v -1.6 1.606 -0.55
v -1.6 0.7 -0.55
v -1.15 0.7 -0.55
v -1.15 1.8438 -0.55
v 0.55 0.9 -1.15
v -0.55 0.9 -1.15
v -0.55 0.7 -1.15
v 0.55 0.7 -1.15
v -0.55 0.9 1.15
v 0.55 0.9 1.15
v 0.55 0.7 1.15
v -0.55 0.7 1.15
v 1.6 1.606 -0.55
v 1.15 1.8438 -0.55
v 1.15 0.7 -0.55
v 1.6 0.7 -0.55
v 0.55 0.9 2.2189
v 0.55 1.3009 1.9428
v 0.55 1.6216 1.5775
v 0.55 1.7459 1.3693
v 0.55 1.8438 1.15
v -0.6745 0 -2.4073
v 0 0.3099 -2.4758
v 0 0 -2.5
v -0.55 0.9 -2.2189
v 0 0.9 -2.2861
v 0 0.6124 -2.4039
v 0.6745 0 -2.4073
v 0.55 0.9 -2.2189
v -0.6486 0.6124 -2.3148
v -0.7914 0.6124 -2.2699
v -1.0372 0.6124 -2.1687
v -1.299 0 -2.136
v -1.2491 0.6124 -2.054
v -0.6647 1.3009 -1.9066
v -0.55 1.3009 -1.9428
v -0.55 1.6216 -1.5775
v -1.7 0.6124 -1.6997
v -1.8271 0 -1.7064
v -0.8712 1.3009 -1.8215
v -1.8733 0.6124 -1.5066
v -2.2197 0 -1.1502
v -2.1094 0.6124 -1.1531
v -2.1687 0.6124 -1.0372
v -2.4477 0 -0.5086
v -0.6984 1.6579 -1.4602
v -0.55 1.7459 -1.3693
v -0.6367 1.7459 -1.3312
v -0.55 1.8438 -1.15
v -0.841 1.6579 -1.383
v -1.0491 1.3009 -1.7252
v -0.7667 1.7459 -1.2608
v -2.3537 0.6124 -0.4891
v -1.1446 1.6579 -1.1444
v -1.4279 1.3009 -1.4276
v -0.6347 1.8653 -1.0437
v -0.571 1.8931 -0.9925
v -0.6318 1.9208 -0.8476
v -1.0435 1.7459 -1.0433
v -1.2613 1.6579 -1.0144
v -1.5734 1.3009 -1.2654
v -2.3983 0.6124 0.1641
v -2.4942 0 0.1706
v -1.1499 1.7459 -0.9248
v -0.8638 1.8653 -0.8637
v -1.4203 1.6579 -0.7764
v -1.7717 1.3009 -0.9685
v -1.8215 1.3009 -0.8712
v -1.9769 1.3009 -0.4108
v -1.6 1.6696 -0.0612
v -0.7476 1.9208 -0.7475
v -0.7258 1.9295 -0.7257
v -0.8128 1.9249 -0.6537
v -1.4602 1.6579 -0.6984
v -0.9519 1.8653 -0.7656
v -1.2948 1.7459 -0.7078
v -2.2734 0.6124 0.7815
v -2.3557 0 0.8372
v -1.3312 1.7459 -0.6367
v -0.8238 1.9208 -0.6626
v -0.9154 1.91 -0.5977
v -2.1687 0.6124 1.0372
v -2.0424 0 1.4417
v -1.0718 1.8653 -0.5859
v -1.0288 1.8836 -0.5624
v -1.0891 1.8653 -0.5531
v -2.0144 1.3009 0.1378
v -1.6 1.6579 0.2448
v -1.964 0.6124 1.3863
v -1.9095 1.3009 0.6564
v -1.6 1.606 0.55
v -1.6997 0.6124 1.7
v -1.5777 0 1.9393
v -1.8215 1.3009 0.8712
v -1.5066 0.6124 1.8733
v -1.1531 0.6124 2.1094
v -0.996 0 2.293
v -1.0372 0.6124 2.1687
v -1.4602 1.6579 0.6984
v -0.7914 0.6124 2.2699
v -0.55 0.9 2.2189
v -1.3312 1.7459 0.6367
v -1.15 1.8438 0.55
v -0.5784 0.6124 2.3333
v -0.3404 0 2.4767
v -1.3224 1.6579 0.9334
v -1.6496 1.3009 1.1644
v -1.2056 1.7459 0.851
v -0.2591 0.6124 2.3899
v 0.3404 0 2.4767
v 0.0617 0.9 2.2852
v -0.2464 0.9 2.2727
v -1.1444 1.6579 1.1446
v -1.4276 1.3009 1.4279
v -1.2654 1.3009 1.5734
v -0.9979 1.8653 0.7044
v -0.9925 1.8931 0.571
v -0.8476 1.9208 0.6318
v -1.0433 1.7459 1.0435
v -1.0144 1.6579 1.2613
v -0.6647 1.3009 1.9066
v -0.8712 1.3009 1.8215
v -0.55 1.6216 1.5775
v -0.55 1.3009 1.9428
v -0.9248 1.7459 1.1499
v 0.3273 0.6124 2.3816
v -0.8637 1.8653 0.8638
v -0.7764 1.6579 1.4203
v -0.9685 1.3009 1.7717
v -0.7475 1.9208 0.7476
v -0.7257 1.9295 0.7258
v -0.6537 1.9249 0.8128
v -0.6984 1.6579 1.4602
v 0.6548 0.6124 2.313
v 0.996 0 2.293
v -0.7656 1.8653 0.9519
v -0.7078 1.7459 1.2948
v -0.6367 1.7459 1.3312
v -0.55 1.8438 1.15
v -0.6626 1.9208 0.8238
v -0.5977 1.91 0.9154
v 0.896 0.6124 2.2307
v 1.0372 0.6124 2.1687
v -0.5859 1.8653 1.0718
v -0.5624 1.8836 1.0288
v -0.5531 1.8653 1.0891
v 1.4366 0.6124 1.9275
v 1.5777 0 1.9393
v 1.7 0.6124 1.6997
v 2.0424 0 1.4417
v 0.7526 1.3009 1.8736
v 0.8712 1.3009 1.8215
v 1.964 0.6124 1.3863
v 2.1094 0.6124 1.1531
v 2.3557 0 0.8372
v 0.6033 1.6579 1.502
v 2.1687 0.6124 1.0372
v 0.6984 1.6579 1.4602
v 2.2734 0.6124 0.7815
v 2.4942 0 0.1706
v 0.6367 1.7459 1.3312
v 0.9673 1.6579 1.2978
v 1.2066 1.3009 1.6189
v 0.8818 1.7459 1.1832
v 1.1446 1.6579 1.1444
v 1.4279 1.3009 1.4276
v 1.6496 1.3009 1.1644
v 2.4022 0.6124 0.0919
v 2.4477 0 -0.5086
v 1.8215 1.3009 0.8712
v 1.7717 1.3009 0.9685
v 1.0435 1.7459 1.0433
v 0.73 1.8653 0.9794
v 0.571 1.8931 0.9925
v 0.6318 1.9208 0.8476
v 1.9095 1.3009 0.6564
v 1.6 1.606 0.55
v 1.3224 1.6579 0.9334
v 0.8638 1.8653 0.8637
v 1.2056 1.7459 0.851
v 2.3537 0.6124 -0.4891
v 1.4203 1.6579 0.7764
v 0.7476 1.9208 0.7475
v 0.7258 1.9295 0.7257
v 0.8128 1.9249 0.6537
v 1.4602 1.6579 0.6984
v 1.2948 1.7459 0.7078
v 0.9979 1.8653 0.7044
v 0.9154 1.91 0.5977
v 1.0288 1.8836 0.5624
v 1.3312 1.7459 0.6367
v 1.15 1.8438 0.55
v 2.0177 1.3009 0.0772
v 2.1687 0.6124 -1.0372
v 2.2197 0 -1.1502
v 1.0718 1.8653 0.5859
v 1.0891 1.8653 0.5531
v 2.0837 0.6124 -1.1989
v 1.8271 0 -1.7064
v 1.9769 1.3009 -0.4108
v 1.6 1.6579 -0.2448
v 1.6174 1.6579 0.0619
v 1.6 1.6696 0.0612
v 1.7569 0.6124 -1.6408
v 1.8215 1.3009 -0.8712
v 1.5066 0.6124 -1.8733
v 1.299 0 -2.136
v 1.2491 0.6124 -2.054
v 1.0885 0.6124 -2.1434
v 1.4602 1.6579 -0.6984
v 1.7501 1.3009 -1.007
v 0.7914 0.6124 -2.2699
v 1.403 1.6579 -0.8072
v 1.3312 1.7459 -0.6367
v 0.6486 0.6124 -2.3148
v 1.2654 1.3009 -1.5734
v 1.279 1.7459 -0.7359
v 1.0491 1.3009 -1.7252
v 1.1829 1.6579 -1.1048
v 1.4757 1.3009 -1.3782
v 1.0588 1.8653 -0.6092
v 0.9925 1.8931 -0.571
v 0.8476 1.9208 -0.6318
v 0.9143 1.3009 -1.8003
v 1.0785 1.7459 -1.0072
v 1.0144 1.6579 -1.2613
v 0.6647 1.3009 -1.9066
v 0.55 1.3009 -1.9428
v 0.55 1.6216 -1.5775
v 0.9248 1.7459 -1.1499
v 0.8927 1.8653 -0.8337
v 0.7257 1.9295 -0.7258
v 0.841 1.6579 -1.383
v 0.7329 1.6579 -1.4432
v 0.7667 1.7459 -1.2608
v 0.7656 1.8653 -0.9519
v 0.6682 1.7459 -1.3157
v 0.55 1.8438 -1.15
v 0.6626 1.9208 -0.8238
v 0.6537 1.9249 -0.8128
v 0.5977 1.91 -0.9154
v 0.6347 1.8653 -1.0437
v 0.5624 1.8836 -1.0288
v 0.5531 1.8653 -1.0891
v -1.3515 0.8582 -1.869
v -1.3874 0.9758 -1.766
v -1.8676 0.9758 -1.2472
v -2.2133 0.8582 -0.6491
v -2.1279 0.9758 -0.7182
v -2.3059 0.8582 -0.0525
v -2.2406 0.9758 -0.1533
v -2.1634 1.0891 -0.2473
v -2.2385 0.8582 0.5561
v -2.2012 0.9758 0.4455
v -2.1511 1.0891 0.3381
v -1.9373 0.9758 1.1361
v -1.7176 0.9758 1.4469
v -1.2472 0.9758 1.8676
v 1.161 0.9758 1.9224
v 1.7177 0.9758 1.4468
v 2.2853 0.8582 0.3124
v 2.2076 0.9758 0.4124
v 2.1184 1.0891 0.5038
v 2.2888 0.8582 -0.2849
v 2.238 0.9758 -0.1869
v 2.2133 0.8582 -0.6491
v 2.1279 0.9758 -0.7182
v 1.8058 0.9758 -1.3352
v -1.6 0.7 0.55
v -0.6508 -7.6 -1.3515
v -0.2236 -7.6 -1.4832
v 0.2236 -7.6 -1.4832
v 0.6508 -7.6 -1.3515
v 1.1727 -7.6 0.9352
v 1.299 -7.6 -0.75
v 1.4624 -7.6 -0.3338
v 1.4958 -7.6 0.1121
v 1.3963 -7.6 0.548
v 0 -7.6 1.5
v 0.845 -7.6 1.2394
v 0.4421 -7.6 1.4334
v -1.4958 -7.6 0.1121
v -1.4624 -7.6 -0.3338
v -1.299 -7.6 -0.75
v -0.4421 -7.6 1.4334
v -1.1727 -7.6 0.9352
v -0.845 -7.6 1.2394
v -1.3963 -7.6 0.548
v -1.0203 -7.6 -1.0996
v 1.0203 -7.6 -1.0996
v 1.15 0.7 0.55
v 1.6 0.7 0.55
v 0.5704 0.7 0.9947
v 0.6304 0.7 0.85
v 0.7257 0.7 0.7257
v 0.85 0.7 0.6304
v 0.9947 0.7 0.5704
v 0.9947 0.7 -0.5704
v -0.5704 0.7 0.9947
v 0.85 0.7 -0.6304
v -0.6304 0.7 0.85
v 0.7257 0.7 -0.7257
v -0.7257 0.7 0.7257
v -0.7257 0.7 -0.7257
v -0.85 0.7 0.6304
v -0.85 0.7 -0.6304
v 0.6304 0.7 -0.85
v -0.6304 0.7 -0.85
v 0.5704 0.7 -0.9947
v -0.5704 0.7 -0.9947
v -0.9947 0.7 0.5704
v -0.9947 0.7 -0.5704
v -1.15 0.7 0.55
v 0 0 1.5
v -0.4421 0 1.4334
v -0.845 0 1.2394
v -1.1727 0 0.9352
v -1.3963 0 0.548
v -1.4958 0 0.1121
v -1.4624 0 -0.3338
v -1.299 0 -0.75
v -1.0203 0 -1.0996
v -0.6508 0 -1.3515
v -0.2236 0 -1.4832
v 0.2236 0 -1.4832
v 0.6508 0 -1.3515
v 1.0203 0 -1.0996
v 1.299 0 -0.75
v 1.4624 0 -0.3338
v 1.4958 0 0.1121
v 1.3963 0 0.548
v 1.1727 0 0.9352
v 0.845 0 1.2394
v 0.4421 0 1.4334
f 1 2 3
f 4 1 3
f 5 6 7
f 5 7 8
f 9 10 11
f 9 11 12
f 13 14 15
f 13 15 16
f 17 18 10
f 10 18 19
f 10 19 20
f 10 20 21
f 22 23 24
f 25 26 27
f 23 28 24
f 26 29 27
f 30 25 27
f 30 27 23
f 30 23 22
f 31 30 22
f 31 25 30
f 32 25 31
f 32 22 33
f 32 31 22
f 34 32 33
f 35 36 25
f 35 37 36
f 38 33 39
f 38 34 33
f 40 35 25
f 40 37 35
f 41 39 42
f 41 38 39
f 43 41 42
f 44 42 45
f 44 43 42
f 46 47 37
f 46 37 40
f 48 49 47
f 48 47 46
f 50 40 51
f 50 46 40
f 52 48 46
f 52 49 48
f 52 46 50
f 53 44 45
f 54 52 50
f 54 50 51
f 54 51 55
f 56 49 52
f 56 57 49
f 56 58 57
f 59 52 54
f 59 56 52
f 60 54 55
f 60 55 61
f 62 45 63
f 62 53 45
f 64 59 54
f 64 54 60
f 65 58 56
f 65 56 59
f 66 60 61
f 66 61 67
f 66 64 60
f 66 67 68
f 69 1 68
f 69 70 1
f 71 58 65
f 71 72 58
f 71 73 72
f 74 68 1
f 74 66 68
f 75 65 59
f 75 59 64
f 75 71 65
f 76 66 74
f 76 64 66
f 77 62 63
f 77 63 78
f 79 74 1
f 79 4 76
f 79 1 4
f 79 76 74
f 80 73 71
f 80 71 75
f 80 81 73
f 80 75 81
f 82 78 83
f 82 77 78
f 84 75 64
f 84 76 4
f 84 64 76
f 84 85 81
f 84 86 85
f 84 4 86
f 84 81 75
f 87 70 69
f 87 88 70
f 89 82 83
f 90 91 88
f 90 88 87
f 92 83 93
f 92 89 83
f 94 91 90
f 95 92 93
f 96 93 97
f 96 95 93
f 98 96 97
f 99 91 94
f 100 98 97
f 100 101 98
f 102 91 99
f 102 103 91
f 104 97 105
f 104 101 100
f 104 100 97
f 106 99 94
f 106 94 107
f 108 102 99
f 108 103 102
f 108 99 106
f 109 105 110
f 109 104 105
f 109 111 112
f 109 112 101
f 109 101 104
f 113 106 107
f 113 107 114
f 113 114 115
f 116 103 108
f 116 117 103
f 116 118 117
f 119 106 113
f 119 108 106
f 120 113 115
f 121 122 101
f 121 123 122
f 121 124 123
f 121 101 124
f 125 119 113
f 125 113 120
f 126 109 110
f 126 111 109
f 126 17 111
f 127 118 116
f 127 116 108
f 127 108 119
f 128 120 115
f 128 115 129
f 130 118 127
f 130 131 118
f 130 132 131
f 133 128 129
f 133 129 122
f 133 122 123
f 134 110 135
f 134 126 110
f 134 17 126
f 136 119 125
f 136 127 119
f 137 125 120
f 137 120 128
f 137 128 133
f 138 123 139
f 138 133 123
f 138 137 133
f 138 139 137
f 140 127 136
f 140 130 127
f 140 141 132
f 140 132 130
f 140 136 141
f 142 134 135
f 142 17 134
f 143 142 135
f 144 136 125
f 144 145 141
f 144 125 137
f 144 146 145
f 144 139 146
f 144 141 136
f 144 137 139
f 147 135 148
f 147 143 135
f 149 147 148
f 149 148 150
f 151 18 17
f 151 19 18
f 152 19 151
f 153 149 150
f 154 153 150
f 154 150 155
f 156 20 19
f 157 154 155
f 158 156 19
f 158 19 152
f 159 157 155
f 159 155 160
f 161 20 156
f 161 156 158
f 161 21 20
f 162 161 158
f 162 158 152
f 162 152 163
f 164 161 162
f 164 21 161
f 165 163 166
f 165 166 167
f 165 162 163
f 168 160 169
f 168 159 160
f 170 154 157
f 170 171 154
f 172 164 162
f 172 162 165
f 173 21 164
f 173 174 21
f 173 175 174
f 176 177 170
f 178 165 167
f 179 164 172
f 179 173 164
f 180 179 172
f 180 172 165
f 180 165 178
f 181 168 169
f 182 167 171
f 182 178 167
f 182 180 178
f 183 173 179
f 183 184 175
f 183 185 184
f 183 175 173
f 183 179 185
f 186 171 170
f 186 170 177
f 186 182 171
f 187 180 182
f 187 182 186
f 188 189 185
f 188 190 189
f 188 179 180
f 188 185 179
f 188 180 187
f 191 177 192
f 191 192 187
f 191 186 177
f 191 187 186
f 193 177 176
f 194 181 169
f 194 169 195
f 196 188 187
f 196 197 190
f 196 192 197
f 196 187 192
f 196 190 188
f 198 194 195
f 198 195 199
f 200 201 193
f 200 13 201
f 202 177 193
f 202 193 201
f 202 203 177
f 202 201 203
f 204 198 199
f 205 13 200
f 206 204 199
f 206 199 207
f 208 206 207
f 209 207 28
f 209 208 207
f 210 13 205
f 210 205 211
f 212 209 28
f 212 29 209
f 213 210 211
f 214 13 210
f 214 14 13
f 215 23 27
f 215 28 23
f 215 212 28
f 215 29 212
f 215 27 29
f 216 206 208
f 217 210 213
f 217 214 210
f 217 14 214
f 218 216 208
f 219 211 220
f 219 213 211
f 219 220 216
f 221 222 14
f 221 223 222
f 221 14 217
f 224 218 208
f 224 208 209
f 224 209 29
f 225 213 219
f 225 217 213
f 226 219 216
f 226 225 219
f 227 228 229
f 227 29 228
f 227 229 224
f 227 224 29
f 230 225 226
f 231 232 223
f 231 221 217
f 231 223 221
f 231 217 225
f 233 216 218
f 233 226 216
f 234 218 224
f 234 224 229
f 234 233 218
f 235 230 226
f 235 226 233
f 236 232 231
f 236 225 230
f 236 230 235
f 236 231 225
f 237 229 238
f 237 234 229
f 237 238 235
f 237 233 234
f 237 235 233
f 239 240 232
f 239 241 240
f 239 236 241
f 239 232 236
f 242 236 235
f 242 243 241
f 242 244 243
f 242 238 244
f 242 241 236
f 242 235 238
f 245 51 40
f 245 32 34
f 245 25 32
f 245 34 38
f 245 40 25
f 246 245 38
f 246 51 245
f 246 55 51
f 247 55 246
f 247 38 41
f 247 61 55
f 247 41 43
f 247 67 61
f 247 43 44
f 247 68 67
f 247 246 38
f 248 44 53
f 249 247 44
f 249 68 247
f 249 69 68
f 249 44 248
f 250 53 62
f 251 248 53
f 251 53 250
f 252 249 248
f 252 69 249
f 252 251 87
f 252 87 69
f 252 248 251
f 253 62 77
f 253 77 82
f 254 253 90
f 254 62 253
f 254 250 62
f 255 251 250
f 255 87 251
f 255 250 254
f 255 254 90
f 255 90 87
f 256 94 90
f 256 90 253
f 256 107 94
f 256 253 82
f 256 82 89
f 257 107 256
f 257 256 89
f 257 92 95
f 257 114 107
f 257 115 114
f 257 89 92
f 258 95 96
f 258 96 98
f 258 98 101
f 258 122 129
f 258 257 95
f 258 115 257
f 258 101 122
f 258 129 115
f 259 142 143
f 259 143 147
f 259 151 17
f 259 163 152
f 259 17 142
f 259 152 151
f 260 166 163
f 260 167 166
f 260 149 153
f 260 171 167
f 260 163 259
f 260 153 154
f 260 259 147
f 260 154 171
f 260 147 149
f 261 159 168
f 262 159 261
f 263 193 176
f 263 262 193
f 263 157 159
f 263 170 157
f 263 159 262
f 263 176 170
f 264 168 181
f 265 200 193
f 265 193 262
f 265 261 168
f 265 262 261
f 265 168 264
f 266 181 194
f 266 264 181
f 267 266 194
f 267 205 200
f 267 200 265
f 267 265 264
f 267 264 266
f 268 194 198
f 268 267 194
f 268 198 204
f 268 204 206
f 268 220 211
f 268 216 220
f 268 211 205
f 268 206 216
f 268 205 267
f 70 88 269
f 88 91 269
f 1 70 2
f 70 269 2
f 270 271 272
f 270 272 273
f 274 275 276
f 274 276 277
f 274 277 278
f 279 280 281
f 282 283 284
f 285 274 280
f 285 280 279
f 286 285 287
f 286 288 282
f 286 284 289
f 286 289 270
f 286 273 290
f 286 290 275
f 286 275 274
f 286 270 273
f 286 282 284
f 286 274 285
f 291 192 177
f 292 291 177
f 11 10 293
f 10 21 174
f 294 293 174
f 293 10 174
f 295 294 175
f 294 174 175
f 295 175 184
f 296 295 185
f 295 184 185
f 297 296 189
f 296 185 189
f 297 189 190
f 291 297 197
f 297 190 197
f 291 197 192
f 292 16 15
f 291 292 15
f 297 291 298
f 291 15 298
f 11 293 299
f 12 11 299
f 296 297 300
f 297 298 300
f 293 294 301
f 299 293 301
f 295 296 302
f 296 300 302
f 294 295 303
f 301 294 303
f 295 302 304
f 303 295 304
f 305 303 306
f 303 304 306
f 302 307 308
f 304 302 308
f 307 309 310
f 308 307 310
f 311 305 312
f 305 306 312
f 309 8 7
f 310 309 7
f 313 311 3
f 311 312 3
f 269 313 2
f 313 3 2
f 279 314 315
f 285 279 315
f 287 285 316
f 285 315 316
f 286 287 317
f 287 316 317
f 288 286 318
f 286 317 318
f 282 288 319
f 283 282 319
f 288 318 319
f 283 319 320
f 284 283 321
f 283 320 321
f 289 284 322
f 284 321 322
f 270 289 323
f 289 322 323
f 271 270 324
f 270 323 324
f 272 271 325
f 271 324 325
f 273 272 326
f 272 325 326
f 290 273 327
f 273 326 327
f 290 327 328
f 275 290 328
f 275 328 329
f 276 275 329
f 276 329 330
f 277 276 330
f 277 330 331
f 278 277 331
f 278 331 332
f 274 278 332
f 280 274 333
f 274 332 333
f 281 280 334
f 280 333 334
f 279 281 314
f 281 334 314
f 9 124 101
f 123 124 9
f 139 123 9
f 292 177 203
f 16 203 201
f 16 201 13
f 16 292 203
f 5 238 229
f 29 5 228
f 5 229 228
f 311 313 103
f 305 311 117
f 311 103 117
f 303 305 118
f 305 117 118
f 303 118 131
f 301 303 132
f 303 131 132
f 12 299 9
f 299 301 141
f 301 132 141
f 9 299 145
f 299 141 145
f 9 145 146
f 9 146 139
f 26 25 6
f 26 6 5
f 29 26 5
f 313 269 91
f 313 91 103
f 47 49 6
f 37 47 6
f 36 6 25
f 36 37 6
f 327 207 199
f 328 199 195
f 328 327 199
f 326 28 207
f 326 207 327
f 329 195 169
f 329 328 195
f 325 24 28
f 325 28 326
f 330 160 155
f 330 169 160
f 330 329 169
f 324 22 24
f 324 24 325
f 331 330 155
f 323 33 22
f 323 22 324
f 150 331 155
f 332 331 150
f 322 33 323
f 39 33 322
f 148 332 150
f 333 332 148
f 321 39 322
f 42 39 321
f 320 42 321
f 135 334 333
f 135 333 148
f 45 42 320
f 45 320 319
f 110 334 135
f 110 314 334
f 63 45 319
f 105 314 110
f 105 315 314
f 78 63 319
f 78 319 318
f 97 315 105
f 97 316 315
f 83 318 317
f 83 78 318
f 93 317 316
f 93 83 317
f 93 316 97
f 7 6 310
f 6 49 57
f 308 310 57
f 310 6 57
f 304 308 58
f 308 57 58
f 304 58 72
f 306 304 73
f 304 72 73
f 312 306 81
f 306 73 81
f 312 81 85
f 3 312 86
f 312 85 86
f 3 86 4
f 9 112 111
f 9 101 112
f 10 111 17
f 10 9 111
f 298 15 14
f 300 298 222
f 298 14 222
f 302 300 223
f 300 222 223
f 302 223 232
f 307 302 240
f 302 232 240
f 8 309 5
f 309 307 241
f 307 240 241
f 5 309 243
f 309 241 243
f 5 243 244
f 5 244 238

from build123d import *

# Parameters (mm, degrees)
SKETCH3_W           = 1.1
SKETCH3_H           = 4.9
CUT_EXTRUDE1_DEPTH  = 1.1
SKETCH4_W           = 3.2
SKETCH4_H           = 1.1
CUT_EXTRUDE2_DEPTH  = 4.702516225
FILLET1_R           = 0.6
CUT_EXTRUDE3_DEPTH  = 0.2
SKETCH2_R           = 1.5
BOSS_EXTRUDE1_DEPTH = 7.6


with BuildPart() as part:
    # Sketch1 → Revolve1 (revolve)
    with BuildSketch(Plane(origin=(0, 0, 0), x_dir=(0, 0, -1), z_dir=(1, 0, 0))):
        with BuildLine():
            Line((0, 2), (0, 0))
            Line((0, 0), (2.5, 0))
            ThreePointArc((2.5, 0), (1.914213562, 1.414213562), (0.5, 2))
            Line((0.5, 2), (0, 2))
        make_face()
    revolve(axis=Axis((0, 0, 0), (0, 1, 0)))

    # Sketch3 → Cut-Extrude1 (cut)
    with BuildSketch(Plane(origin=(0, 2, 0), x_dir=(1, 0, 0), z_dir=(0, 1, 0))):
        Rectangle(SKETCH3_W, SKETCH3_H)
    extrude(amount=-CUT_EXTRUDE1_DEPTH, mode=Mode.SUBTRACT)

    # Sketch4 → Cut-Extrude2 (cut, through all)
    with BuildSketch(Plane(origin=(0, 0.9, 0), x_dir=(1, 0, 0), z_dir=(0, 1, 0))):
        Rectangle(SKETCH4_W, SKETCH4_H)
    extrude(amount=CUT_EXTRUDE2_DEPTH, mode=Mode.SUBTRACT)

    # Fillet1
    fillet1_edges = [part.edges().sort_by_distance(p)[0] for p in [
        (0.55, 1.440305176, 0.55),
        (-0.55, 1.440305183, 0.55),
        (0.55, 1.440305183, -0.55),
        (-0.55, 1.440305176, -0.55),
    ]]
    fillet(fillet1_edges, radius=FILLET1_R)

    # Sketch5 → Cut-Extrude3 (cut)
    with BuildSketch(Plane(origin=(0, 0.9, 0), x_dir=(1, 0, 0), z_dir=(0, 1, 0))):
        with BuildLine():
            Line((-0.55, 1.15), (0.55, 1.15))
            ThreePointArc((0.55, 1.15), (0.725735931, 0.725735931), (1.15, 0.55))
            Line((1.15, 0.55), (1.6, 0.55))
            Line((1.6, 0.55), (1.6, -0.55))
            Line((1.6, -0.55), (1.15, -0.55))
            ThreePointArc((1.15, -0.55), (0.725735931, -0.725735931), (0.55, -1.15))
            Line((0.55, -1.15), (-0.55, -1.15))
            ThreePointArc((-0.55, -1.15), (-0.725735931, -0.725735931), (-1.15, -0.55))
            Line((-1.15, -0.55), (-1.6, -0.55))
            Line((-1.6, -0.55), (-1.6, 0.55))
            Line((-1.6, 0.55), (-1.15, 0.55))
            ThreePointArc((-1.15, 0.55), (-0.725735931, 0.725735931), (-0.55, 1.15))
        make_face()
    extrude(amount=-CUT_EXTRUDE3_DEPTH, mode=Mode.SUBTRACT)

    # Sketch2 → Boss-Extrude1 (add)
    with BuildSketch(Plane.XZ):
        with Locations(Location((0, 0, 0), (0, 0, 90))):
            Circle(SKETCH2_R)
    extrude(amount=BOSS_EXTRUDE1_DEPTH)


solid = part.part
